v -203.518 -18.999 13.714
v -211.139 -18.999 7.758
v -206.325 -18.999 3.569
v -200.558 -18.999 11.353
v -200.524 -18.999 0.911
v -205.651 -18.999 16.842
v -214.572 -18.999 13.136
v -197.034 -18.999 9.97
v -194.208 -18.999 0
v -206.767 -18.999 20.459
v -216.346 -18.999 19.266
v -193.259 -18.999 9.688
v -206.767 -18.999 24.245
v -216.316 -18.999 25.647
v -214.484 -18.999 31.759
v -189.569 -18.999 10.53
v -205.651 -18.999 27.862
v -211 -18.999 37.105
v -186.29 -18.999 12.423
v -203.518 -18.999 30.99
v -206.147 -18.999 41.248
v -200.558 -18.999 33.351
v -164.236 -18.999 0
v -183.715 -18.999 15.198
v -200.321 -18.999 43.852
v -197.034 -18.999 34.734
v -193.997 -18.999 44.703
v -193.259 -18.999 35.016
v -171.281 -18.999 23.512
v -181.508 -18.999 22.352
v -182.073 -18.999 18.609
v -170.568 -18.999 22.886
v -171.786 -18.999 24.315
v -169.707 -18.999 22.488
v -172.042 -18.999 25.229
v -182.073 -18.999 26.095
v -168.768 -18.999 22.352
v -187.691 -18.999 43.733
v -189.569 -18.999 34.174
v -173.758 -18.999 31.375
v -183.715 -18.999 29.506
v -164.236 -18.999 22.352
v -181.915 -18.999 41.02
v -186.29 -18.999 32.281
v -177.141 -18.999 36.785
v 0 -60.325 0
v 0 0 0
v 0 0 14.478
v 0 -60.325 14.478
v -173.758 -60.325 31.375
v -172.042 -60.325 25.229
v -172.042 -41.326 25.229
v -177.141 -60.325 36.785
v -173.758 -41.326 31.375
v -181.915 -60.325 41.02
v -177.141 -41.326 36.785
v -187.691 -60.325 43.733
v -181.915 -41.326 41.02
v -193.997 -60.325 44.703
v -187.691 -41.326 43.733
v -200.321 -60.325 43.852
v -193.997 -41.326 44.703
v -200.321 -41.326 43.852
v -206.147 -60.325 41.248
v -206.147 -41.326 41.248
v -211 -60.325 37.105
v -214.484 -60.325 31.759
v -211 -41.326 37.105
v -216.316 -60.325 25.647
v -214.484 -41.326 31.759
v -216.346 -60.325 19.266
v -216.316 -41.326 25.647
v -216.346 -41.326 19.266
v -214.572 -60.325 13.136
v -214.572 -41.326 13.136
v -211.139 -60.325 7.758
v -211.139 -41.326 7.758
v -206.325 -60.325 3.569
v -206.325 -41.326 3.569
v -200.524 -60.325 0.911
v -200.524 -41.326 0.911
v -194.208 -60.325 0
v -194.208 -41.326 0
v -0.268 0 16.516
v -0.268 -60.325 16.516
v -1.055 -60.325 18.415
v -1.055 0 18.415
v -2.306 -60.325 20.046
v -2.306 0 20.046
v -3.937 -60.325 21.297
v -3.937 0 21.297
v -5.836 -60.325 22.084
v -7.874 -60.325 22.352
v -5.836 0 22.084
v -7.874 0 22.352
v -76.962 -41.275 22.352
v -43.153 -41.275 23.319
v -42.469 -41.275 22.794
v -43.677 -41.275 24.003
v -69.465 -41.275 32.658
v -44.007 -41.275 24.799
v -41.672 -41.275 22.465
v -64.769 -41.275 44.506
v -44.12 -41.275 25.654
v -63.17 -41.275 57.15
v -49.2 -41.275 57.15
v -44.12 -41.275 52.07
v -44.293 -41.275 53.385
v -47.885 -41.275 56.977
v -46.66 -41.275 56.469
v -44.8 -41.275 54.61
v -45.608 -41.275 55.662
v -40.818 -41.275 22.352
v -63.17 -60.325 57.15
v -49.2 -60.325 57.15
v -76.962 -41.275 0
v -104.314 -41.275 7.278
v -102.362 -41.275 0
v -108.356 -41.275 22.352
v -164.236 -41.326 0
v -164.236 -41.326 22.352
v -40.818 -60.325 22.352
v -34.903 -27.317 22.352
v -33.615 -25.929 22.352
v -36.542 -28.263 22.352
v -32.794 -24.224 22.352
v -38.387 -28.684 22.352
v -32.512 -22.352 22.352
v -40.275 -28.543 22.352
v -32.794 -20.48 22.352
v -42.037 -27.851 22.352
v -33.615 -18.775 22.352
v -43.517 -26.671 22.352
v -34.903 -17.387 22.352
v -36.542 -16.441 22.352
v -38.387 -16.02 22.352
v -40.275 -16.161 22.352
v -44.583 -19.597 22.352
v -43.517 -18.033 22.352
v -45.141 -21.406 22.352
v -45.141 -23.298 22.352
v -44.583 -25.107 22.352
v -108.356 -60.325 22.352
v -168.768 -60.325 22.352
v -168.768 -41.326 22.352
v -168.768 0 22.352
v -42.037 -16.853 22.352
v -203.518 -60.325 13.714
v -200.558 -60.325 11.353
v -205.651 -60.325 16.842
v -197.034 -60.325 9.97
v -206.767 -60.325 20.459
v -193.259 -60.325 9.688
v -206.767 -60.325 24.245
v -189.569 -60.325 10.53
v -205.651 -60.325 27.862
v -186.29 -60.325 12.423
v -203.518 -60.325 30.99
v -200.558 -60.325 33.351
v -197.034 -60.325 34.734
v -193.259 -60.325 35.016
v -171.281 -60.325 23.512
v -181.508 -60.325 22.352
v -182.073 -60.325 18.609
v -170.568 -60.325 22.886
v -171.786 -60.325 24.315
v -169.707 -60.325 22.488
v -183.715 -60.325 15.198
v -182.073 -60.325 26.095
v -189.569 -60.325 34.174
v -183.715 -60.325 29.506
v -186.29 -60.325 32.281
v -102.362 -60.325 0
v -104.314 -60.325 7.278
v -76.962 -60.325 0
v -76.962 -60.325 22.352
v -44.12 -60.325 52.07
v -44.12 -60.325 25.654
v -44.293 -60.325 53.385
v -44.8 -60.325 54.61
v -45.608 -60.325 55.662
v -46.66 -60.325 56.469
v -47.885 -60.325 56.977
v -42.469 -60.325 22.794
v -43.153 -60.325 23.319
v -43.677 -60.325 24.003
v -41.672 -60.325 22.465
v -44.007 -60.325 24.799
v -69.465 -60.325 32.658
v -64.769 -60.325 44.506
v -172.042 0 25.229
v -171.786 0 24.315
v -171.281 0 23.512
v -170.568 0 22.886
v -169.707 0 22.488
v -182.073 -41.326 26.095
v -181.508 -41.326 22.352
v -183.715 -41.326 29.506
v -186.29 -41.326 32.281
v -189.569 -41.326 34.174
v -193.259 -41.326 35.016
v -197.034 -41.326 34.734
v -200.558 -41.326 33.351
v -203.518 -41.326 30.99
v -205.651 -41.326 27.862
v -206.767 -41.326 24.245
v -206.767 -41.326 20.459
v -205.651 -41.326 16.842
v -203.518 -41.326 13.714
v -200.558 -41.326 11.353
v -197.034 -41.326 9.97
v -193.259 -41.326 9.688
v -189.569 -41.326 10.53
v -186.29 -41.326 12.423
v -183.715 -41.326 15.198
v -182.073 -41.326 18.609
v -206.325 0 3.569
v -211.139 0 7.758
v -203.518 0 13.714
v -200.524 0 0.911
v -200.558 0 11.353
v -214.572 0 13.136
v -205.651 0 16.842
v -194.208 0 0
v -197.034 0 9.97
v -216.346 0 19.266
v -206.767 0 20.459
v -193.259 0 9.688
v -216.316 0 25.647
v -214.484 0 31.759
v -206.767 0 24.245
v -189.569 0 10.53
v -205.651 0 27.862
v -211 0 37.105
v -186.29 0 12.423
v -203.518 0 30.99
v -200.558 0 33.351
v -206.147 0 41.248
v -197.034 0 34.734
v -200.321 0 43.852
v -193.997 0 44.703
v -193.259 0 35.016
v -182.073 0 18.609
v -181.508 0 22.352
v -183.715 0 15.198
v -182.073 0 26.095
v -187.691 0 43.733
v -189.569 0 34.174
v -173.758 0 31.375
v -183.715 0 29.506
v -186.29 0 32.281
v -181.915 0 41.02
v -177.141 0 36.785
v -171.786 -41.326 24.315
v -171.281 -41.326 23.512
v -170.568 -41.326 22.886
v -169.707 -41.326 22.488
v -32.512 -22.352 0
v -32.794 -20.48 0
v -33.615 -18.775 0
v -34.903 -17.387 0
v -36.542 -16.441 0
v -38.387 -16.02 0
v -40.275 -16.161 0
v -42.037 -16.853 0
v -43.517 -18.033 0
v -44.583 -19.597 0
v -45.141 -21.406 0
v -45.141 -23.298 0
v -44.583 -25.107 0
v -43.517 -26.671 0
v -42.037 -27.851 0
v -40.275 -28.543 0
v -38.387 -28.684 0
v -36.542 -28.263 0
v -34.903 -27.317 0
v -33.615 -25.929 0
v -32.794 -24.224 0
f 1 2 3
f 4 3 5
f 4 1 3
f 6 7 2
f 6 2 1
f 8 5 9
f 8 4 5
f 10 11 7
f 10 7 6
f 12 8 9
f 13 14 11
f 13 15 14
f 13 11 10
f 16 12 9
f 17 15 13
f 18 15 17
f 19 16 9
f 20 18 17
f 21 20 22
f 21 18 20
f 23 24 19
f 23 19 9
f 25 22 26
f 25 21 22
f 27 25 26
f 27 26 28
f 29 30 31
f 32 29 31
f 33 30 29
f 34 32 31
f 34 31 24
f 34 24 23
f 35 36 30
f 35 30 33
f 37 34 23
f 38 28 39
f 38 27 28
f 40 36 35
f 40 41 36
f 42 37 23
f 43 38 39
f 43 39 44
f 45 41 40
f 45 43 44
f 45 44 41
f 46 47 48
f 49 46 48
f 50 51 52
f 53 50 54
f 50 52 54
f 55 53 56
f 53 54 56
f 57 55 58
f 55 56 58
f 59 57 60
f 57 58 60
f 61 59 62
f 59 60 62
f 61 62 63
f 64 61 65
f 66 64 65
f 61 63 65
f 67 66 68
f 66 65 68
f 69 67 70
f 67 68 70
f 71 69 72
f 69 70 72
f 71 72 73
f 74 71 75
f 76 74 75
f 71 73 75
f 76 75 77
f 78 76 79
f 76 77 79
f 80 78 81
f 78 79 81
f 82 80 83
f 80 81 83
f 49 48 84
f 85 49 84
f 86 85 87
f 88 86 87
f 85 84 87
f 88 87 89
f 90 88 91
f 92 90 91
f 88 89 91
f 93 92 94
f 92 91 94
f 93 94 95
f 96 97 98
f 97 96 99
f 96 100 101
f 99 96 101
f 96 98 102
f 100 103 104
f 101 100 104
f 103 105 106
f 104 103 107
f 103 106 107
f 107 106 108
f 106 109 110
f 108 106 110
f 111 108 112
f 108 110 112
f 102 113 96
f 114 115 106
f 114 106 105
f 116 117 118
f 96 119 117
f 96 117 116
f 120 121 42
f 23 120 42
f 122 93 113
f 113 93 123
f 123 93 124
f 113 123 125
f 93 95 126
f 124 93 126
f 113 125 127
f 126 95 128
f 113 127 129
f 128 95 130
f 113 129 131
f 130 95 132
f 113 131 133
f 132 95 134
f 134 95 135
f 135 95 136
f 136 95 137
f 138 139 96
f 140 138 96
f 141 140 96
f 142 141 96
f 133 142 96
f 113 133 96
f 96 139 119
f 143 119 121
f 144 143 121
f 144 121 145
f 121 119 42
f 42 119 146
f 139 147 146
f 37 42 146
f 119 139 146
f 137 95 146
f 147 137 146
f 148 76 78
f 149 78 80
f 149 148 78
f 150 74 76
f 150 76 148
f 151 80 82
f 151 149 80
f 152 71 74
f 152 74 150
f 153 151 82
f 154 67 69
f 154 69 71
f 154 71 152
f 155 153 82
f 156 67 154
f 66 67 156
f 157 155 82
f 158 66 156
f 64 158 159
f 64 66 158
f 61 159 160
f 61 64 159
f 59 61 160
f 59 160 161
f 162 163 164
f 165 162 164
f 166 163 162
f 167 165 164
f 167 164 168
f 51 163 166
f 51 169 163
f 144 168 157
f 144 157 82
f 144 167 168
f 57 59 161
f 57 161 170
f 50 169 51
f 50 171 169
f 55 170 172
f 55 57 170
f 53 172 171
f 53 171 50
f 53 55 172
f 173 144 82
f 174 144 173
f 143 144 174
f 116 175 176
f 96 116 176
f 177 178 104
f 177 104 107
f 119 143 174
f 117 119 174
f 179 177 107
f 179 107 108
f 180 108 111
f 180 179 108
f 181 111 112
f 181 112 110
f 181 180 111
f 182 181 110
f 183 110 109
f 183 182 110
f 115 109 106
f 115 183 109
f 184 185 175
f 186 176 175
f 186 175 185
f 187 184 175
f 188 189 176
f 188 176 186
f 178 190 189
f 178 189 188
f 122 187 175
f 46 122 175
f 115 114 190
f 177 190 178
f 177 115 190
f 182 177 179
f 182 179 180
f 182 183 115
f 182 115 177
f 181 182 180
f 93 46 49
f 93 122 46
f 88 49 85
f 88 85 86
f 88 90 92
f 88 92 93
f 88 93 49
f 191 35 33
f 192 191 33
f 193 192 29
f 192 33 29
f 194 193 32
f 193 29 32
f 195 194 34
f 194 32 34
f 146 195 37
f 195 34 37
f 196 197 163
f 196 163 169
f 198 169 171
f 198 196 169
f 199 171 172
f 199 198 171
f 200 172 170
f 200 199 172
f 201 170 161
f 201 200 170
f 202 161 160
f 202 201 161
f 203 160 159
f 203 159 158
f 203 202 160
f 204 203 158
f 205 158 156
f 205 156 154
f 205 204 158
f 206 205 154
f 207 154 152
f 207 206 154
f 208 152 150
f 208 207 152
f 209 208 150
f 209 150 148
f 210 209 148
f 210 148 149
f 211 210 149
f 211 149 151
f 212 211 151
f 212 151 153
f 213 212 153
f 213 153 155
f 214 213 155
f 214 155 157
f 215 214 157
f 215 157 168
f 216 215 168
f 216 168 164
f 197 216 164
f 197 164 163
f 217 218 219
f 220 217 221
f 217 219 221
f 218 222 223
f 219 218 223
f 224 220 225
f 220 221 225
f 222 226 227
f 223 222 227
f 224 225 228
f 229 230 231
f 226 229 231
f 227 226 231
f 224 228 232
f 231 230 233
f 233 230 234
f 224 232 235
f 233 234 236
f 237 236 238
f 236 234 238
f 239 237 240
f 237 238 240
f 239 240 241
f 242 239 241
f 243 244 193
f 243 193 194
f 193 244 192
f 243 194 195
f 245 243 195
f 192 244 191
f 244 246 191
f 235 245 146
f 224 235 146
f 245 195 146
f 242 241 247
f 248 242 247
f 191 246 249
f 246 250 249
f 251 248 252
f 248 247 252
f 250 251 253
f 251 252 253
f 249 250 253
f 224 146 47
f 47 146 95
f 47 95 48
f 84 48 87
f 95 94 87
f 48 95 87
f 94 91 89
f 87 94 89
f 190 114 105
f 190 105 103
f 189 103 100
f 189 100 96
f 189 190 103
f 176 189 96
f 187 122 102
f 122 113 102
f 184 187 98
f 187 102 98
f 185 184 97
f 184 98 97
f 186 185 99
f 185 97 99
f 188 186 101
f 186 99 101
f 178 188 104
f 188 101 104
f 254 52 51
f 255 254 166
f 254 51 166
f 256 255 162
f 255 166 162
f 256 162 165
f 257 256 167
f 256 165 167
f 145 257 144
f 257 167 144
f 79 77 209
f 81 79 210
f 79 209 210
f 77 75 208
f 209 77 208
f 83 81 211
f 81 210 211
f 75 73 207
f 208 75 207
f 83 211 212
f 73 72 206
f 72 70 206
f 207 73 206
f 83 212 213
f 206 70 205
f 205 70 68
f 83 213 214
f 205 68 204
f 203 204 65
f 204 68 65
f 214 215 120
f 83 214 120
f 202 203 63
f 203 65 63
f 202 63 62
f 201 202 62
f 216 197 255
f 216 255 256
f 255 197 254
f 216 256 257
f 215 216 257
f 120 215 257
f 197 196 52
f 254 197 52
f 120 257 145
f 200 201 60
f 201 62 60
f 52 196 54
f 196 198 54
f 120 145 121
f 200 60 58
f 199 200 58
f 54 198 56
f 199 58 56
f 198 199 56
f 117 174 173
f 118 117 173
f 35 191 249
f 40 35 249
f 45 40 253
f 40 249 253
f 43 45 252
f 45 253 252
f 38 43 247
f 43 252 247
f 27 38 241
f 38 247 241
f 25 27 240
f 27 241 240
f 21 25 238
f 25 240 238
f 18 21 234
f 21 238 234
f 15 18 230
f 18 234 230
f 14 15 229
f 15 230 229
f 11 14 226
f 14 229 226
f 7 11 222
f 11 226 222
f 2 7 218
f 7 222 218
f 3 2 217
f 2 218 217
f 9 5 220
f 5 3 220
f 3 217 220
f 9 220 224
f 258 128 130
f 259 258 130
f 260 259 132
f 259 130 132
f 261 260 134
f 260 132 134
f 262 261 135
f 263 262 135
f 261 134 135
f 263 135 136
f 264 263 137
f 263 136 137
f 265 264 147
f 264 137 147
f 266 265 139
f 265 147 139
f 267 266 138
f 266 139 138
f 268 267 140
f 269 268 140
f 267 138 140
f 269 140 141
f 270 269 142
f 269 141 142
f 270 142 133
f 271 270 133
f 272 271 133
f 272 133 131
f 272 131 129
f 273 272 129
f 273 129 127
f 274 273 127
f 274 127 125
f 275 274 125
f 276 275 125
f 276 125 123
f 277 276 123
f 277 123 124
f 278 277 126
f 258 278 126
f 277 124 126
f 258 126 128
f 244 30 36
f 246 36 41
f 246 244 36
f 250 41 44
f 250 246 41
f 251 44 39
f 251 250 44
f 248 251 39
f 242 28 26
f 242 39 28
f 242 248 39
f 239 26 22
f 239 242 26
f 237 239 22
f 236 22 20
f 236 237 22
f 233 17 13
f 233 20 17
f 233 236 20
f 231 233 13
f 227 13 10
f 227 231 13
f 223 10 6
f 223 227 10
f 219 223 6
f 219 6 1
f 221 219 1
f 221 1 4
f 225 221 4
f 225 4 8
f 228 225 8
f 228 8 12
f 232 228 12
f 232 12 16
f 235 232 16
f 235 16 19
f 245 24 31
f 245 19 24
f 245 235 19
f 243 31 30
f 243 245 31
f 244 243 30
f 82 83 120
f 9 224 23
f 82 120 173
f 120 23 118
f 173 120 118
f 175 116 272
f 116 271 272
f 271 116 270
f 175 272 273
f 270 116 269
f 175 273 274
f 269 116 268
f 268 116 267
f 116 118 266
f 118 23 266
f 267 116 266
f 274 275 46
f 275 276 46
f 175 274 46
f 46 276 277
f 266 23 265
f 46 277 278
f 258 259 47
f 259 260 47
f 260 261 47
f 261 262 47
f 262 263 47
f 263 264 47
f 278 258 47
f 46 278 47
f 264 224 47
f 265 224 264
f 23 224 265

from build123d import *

# Parameters (mm, degrees)
F0_R     = 12.7
F1_DEPTH = 60.325
F3_DEPTH = 19.05
F4_DEPTH = 19.05
F5_R     = 6.35
F6_DEPTH = 22.352
F8_R     = 3.302
F7_W     = 69.4968977088
F7_H     = 22.3266
F9_DEPTH = 63.5


with BuildPart() as f1:
    # F0 (on Front) → F1 (new body)
    with BuildSketch(Plane.XZ):
        with BuildLine():
            Line((-194.2084, 0), (-102.362, 0))
            Line((-102.362, 0), (-104.313945544, 7.2784410115))
            ThreePointArc((-104.313945544, 7.2784410115), (-129.5850257878, 8.8118186082), (-150.9776, 22.352))
            Line((-150.9776, 22.352), (-171.8564, 22.352))
            ThreePointArc((-171.8564, 22.352), (-210.0136507731, 38.1572507731), (-194.2084, 0))
        make_face()
        with Locations((-194.2084, 22.352)):
            Circle(F0_R, mode=Mode.SUBTRACT)
        with BuildLine():
            ThreePointArc((-150.9776, 22.352), (-129.5850257878, 8.8118186082), (-104.313945544, 7.2784410115))
            Line((-104.313945544, 7.2784410115), (-108.3564, 22.352))
            Line((-108.3564, 22.352), (-150.9776, 22.352))
        make_face()
        with BuildLine():
            ThreePointArc((-104.313945544, 7.2784410115), (-89.4508847111, 12.6611726116), (-76.962, 22.352))
            Line((-76.962, 22.352), (-108.3564, 22.352))
            Line((-108.3564, 22.352), (-104.313945544, 7.2784410115))
        make_face()
        with BuildLine():
            Line((-102.362, 0), (-76.962, 0))
            Line((-76.962, 0), (-76.962, 22.352))
            ThreePointArc((-76.962, 22.352), (-89.4508847111, 12.6611726116), (-104.313945544, 7.2784410115))
            Line((-104.313945544, 7.2784410115), (-102.362, 0))
        make_face()
        with BuildLine():
            Line((-76.962, 0), (0, 0))
            Line((0, 0), (0, 14.478))
            ThreePointArc((0, 14.478), (-2.3062412049, 20.0457587951), (-7.874, 22.352))
            Line((-7.874, 22.352), (-44.1198, 22.352))
            Line((-44.1198, 22.352), (-76.962, 22.352))
            Line((-76.962, 22.352), (-76.962, 0))
        make_face()
    extrude(amount=F1_DEPTH)

    # F2 (on face) → F3 (join)
    with BuildSketch(Plane.XZ.offset(60.325)):
        with BuildLine():
            ThreePointArc((-63.1698000533, 57.15), (-66.743984667, 38.4343576399), (-76.962, 22.352))
            Line((-76.962, 22.352), (-44.1198, 22.352))
            Line((-44.1198, 22.352), (-44.1198, 52.07))
            ThreePointArc((-44.1198, 52.07), (-45.6076975516, 55.6621024484), (-49.1998, 57.15))
            Line((-49.1998, 57.15), (-63.1698000533, 57.15))
        make_face()
    extrude(amount=-F3_DEPTH)

    # F2 (on face) → F4 (cut)
    with BuildSketch(Plane.XZ.offset(60.325)):
        with BuildLine():
            ThreePointArc((-104.313945544, 7.2784410115), (-89.4508847111, 12.6611726116), (-76.962, 22.352))
            Line((-76.962, 22.352), (-108.3564, 22.352))
            Line((-108.3564, 22.352), (-104.313945544, 7.2784410115))
        make_face()
        with BuildLine():
            Line((-76.962, 0), (-76.962, 22.352))
            ThreePointArc((-76.962, 22.352), (-89.4508847111, 12.6611726116), (-104.313945544, 7.2784410115))
            Line((-104.313945544, 7.2784410115), (-102.362, 0))
            Line((-102.362, 0), (-76.962, 0))
        make_face()
    extrude(amount=-F4_DEPTH, mode=Mode.SUBTRACT)

    # F5 (on face) → F6 (cut, through all)
    with BuildSketch(Plane.XY.offset(22.352)):
        with Locations((-38.862, -22.352)):
            Circle(F5_R)
    extrude(amount=-F6_DEPTH, mode=Mode.SUBTRACT)

    # F8
    f8_edges = [f1.edges().sort_by_distance(p)[0] for p in [
        (-171.8564, -30.1625, 22.352),
        (-44.1198, -50.8, 22.352),
    ]]
    fillet(f8_edges, radius=F8_R)

    # F7 (on face) → F9 (cut, symmetric)
    with BuildSketch(Plane.XY.offset(22.352)):
        with Locations((-198.9848488544, -30.1625)):
            Rectangle(F7_W, F7_H)
    extrude(amount=F9_DEPTH, both=True, mode=Mode.SUBTRACT)


solid = f1.part
